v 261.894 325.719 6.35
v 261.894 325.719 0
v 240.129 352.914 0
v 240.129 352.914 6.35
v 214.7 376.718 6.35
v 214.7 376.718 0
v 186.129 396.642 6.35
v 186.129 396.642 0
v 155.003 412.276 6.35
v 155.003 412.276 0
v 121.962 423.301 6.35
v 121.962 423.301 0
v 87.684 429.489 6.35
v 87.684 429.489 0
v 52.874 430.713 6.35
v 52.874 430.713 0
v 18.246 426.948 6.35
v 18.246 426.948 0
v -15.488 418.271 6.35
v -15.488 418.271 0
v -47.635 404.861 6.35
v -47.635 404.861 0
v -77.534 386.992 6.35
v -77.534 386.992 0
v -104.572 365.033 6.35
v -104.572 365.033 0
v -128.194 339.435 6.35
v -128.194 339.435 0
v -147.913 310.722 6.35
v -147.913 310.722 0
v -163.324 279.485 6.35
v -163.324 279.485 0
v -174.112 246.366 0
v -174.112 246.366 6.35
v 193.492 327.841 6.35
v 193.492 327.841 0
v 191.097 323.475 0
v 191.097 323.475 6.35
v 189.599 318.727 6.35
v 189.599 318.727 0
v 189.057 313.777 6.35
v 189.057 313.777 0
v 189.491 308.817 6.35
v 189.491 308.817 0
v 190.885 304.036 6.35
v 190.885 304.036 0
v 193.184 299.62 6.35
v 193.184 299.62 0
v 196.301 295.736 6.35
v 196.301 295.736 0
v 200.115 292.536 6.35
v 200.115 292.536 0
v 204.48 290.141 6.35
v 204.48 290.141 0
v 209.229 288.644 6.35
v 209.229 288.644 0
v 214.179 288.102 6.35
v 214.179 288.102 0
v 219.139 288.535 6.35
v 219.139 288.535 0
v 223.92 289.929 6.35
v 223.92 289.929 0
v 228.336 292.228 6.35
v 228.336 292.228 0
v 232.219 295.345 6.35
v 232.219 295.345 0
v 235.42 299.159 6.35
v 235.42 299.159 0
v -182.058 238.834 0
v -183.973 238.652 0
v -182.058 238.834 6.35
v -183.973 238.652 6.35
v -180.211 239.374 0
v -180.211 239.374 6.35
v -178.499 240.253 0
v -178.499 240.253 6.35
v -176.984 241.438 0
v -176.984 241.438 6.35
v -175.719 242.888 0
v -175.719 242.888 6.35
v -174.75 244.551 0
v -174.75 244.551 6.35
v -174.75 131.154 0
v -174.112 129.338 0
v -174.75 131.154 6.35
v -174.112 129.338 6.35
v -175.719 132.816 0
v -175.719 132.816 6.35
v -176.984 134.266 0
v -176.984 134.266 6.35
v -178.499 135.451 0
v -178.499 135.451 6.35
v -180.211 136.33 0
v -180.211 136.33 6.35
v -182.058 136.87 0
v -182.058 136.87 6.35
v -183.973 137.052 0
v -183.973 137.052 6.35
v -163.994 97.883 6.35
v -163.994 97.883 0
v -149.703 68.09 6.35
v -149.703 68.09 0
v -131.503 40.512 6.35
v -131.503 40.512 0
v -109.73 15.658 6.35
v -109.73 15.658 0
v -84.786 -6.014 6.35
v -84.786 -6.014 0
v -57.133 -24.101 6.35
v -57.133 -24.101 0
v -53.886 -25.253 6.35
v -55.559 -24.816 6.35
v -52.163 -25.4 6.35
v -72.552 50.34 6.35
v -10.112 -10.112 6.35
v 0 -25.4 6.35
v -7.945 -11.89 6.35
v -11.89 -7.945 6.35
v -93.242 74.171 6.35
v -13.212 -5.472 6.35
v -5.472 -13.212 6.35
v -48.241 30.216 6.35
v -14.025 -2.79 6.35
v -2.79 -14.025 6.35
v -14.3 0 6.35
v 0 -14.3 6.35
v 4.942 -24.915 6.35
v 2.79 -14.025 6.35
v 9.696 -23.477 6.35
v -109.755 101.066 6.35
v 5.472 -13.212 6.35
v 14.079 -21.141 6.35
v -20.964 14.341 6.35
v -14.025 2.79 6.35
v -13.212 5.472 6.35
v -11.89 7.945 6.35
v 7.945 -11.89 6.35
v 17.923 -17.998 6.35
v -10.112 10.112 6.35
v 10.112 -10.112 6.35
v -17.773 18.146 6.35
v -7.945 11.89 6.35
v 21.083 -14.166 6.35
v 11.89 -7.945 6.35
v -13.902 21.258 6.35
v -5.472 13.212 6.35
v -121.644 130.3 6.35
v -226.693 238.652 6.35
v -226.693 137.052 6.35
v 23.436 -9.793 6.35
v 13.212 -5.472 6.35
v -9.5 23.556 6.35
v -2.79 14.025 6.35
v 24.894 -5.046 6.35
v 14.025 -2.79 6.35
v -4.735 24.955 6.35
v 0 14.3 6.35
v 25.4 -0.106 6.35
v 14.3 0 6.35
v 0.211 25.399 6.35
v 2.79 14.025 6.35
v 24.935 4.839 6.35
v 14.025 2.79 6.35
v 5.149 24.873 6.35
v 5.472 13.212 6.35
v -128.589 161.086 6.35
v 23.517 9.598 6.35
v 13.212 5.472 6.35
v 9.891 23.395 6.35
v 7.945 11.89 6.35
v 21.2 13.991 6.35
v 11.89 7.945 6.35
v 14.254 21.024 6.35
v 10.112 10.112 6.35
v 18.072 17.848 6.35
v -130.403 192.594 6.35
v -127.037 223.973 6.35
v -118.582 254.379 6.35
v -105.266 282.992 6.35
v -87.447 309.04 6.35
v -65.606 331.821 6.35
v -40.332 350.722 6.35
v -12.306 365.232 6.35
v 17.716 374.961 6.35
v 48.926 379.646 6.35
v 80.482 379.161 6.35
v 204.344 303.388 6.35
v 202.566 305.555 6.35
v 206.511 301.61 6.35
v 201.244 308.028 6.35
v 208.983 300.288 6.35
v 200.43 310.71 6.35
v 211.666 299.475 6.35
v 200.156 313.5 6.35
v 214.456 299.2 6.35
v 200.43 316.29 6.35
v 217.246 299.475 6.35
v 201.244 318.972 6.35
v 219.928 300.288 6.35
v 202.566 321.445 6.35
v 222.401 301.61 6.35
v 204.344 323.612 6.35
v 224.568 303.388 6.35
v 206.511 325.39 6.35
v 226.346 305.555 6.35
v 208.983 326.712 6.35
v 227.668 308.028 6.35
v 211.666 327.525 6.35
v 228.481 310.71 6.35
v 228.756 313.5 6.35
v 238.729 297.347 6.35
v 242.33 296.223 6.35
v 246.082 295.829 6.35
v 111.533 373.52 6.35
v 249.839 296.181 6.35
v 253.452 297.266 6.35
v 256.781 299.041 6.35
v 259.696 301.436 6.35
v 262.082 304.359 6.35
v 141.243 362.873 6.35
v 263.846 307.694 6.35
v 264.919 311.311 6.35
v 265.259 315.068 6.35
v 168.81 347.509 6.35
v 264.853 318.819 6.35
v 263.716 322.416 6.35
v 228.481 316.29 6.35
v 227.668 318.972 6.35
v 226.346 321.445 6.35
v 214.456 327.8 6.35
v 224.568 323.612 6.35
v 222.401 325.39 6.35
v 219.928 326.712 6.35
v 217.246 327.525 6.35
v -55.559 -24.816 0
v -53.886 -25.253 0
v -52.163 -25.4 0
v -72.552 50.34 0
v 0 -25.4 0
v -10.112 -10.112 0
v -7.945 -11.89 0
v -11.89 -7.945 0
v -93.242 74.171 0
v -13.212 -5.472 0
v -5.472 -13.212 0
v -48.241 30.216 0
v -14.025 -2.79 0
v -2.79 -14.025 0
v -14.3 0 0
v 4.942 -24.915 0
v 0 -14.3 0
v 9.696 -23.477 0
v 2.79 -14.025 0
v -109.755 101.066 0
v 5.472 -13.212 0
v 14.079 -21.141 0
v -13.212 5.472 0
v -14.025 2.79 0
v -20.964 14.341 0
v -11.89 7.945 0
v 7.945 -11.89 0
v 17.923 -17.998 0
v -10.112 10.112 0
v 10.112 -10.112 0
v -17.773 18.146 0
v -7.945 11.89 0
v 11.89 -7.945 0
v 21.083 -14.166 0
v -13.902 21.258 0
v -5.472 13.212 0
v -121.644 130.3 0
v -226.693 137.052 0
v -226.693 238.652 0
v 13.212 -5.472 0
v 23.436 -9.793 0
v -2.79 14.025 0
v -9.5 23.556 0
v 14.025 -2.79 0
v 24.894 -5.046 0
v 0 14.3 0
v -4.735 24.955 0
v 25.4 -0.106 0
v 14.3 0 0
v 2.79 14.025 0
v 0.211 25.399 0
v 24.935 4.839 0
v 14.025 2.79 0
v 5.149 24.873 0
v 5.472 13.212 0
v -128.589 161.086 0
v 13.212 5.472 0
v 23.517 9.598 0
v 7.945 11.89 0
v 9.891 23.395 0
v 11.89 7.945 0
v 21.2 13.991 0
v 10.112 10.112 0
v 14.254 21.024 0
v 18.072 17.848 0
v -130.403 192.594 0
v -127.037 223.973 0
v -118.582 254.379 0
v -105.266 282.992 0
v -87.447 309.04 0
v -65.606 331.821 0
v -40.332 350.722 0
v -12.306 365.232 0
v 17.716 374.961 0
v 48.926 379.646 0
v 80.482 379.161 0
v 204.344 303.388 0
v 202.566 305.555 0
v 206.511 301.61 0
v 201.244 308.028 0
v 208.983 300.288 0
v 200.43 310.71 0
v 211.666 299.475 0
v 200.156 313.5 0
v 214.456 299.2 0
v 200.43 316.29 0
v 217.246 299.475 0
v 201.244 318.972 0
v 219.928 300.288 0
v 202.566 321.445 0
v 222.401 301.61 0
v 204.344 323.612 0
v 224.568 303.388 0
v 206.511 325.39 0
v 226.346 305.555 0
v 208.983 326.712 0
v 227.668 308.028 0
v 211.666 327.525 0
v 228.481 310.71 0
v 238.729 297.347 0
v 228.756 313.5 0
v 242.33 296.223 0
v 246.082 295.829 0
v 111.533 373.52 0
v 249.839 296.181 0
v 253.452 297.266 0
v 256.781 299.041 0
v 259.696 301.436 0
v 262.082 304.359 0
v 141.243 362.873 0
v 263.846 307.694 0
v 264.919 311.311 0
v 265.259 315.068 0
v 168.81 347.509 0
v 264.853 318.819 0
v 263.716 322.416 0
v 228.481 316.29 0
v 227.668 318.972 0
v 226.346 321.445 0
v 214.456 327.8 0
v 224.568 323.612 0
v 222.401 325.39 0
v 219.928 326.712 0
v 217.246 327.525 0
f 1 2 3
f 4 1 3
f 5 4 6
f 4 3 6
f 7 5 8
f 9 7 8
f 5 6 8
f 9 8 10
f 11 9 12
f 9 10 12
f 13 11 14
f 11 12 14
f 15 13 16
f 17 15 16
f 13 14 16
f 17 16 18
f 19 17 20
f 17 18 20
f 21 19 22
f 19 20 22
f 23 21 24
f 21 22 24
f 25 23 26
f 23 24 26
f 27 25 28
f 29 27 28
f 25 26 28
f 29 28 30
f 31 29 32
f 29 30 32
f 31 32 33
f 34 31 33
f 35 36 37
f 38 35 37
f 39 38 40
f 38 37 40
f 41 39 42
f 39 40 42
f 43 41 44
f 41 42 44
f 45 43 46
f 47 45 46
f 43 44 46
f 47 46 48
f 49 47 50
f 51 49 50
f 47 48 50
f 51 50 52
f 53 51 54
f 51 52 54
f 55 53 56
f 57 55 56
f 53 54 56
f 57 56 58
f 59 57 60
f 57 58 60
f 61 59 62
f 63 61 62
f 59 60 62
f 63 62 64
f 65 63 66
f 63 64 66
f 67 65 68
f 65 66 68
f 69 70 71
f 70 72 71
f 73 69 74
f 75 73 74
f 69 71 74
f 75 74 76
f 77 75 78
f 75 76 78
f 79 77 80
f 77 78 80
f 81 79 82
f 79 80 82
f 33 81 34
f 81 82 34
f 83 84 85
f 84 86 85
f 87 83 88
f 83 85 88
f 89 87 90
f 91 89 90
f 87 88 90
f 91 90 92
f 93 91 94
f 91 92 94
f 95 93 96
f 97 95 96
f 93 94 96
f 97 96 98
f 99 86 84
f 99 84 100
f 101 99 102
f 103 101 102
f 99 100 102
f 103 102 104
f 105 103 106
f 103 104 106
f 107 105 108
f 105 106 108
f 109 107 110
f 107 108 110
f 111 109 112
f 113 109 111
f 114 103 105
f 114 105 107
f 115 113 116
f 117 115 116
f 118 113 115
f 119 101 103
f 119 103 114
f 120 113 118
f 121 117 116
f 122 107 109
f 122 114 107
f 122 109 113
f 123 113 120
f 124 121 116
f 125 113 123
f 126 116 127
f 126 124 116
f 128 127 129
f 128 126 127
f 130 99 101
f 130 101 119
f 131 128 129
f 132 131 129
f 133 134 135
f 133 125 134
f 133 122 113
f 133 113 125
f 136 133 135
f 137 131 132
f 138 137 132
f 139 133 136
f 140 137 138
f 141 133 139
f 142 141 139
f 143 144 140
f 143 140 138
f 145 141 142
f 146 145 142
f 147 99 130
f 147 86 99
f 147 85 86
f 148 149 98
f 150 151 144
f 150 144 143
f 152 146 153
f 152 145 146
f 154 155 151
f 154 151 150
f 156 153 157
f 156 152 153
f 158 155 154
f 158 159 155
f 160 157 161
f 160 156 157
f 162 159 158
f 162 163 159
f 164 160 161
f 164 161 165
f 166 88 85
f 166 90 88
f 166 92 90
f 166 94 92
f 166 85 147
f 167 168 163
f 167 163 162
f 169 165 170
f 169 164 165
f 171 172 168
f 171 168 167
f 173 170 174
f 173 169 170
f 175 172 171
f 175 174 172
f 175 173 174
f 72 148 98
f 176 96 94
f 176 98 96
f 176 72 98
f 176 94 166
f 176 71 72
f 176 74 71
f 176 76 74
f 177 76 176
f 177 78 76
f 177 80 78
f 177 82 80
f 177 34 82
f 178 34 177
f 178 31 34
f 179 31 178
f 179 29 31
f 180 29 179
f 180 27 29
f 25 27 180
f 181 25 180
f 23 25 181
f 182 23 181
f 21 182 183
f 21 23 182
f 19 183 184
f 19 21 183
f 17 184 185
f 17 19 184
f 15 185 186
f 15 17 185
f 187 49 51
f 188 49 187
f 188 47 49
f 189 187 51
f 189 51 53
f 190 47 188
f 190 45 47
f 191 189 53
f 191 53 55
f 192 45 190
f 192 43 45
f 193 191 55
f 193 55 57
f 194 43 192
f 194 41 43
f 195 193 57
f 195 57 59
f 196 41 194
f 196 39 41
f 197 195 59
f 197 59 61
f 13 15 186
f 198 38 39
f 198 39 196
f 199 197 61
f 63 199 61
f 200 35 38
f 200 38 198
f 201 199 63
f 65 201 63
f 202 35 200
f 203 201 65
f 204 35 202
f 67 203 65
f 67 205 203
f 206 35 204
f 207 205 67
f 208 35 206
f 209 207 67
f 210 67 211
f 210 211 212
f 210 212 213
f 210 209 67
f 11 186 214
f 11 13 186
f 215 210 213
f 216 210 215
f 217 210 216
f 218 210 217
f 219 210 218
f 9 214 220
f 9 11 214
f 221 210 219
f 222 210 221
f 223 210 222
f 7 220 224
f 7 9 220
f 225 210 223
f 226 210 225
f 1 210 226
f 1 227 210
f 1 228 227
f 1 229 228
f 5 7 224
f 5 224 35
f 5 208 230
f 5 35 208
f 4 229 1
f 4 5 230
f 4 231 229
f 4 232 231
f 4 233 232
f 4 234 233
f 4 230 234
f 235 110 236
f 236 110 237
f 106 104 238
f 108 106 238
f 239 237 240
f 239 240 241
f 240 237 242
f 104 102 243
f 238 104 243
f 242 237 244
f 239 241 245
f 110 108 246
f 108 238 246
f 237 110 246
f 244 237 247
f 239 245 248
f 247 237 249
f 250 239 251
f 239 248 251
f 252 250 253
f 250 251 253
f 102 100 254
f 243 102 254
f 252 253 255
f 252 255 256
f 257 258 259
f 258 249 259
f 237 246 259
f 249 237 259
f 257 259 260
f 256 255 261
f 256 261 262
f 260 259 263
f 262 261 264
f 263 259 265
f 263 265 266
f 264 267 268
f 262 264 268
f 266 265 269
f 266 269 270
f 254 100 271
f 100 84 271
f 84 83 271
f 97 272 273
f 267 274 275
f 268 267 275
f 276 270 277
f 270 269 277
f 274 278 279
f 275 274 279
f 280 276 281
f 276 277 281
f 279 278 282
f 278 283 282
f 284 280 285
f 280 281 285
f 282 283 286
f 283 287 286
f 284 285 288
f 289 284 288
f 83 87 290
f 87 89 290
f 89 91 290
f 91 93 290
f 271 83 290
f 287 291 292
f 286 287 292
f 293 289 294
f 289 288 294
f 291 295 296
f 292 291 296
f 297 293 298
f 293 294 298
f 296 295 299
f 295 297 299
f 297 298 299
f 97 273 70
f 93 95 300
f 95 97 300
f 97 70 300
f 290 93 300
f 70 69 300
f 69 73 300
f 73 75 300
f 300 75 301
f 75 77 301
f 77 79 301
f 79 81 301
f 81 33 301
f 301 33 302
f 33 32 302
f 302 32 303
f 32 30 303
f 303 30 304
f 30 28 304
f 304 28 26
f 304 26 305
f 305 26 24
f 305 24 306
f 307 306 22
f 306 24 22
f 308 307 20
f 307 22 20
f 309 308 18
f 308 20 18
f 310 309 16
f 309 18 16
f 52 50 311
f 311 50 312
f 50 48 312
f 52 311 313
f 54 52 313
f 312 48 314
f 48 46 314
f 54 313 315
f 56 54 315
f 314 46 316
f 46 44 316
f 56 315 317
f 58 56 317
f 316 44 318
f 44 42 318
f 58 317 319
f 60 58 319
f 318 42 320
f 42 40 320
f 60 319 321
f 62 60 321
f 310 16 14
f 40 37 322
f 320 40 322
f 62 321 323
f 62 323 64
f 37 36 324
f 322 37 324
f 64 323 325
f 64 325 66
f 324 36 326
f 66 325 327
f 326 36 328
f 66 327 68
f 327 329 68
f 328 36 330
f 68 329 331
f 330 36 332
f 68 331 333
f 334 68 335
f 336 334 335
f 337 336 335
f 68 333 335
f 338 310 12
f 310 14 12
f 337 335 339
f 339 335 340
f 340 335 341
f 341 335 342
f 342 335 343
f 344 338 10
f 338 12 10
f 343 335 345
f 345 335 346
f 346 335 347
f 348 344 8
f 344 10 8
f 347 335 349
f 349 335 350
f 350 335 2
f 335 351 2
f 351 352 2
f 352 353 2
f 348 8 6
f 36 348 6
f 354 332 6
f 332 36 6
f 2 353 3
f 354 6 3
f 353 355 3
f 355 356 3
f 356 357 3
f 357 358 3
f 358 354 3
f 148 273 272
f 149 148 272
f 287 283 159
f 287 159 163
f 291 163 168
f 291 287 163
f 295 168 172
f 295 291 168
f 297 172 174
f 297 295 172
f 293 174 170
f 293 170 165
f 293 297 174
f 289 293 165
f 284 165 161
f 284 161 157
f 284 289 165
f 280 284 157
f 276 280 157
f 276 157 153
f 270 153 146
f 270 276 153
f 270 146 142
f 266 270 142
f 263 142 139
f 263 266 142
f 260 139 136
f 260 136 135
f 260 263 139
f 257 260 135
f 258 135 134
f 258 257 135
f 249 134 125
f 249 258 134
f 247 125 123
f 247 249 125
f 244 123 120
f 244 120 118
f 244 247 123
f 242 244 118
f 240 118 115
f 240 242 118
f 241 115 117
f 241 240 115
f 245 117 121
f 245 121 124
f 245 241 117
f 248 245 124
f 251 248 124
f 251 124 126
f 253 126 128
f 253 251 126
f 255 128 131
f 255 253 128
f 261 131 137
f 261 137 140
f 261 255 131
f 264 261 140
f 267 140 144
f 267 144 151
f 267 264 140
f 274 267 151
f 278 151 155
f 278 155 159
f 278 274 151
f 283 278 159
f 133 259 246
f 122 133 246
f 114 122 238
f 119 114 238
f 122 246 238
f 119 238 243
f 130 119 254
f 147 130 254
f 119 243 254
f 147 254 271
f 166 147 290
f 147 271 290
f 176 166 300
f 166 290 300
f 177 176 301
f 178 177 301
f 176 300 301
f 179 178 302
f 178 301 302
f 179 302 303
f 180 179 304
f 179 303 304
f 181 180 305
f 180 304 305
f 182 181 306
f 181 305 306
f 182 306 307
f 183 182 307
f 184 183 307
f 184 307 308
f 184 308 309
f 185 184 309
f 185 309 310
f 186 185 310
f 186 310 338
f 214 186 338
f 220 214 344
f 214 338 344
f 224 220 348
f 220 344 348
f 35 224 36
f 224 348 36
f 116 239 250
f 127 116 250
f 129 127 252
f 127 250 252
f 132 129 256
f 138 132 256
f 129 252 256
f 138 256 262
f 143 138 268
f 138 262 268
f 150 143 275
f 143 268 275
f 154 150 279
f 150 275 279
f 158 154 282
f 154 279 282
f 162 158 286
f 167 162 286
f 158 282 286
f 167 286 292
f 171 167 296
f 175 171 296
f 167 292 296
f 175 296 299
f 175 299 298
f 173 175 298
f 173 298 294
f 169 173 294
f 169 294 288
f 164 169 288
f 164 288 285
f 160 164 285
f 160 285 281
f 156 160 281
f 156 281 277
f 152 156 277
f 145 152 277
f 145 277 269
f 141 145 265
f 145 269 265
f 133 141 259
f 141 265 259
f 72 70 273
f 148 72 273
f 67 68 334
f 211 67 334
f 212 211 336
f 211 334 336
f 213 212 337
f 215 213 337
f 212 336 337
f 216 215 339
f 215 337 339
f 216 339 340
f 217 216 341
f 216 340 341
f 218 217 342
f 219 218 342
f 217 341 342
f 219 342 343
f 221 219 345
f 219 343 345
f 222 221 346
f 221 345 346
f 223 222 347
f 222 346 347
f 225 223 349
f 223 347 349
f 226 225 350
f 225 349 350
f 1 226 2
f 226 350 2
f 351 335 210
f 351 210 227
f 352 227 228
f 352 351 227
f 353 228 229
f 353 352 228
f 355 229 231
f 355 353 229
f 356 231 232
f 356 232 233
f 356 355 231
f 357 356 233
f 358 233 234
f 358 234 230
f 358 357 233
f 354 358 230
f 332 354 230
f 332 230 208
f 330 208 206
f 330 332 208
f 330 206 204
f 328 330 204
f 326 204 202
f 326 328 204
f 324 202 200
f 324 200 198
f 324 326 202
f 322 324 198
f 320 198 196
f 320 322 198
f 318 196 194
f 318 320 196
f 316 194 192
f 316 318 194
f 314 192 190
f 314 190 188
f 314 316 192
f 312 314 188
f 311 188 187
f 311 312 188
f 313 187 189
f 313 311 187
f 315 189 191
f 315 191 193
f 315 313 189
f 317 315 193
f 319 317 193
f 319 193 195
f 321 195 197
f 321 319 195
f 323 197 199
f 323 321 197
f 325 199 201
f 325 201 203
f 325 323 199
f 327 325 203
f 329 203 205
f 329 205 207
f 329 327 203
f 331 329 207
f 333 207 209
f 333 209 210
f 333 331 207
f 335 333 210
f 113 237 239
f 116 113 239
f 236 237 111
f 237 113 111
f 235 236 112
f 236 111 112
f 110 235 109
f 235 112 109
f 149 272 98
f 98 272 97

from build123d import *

# Parameters (mm, degrees)
SKETCH1_R           = 14.3002
BOSS_EXTRUDE1_DEPTH = 6.35
FILLET1_R           = 10.16


with BuildPart() as part:
    # Sketch1 → Boss-Extrude1 (new body)
    with BuildSketch(Plane.XY):
        with BuildLine():
            Line((-54.787568662, -25.4), (0, -25.4))
            ThreePointArc((0, -25.4), (22.465756024, 11.851152107), (-20.96418046, 14.340960136))
            ThreePointArc((-20.96418046, 14.340960136), (-96.891931571, 296.382201918), (193.491662983, 327.840960136))
            ThreePointArc((193.491662983, 327.840960136), (200.114883307, 292.53581954), (235.420023903, 299.159039864))
            ThreePointArc((235.420023903, 299.159039864), (259.695607277, 301.436411104), (261.893582664, 325.719311922))
            ThreePointArc((261.893582664, 325.719311922), (14.357413322, 426.207029502), (-175.89272439, 238.652179878))
            Line((-175.89272439, 238.652179878), (-226.69272439, 238.652179878))
            Line((-226.69272439, 238.652179878), (-226.69272439, 137.052179878))
            Line((-226.69272439, 137.052179878), (-175.89272439, 137.052179878))
            ThreePointArc((-175.89272439, 137.052179878), (-133.078613493, 42.602384317), (-54.787568662, -25.4))
        make_face()
        Circle(SKETCH1_R, mode=Mode.SUBTRACT)
        with Locations((214.455843443, 313.5)):
            Circle(SKETCH1_R, mode=Mode.SUBTRACT)
    extrude(amount=BOSS_EXTRUDE1_DEPTH)

    # Fillet1
    fillet1_edges = [part.edges().sort_by_distance(p)[0] for p in [
        (-54.787568662, -25.4, 3.175),
        (-175.89272439, 137.052179878, 3.175),
        (-175.89272439, 238.652179878, 3.175),
    ]]
    fillet(fillet1_edges, radius=FILLET1_R)


solid = part.part
